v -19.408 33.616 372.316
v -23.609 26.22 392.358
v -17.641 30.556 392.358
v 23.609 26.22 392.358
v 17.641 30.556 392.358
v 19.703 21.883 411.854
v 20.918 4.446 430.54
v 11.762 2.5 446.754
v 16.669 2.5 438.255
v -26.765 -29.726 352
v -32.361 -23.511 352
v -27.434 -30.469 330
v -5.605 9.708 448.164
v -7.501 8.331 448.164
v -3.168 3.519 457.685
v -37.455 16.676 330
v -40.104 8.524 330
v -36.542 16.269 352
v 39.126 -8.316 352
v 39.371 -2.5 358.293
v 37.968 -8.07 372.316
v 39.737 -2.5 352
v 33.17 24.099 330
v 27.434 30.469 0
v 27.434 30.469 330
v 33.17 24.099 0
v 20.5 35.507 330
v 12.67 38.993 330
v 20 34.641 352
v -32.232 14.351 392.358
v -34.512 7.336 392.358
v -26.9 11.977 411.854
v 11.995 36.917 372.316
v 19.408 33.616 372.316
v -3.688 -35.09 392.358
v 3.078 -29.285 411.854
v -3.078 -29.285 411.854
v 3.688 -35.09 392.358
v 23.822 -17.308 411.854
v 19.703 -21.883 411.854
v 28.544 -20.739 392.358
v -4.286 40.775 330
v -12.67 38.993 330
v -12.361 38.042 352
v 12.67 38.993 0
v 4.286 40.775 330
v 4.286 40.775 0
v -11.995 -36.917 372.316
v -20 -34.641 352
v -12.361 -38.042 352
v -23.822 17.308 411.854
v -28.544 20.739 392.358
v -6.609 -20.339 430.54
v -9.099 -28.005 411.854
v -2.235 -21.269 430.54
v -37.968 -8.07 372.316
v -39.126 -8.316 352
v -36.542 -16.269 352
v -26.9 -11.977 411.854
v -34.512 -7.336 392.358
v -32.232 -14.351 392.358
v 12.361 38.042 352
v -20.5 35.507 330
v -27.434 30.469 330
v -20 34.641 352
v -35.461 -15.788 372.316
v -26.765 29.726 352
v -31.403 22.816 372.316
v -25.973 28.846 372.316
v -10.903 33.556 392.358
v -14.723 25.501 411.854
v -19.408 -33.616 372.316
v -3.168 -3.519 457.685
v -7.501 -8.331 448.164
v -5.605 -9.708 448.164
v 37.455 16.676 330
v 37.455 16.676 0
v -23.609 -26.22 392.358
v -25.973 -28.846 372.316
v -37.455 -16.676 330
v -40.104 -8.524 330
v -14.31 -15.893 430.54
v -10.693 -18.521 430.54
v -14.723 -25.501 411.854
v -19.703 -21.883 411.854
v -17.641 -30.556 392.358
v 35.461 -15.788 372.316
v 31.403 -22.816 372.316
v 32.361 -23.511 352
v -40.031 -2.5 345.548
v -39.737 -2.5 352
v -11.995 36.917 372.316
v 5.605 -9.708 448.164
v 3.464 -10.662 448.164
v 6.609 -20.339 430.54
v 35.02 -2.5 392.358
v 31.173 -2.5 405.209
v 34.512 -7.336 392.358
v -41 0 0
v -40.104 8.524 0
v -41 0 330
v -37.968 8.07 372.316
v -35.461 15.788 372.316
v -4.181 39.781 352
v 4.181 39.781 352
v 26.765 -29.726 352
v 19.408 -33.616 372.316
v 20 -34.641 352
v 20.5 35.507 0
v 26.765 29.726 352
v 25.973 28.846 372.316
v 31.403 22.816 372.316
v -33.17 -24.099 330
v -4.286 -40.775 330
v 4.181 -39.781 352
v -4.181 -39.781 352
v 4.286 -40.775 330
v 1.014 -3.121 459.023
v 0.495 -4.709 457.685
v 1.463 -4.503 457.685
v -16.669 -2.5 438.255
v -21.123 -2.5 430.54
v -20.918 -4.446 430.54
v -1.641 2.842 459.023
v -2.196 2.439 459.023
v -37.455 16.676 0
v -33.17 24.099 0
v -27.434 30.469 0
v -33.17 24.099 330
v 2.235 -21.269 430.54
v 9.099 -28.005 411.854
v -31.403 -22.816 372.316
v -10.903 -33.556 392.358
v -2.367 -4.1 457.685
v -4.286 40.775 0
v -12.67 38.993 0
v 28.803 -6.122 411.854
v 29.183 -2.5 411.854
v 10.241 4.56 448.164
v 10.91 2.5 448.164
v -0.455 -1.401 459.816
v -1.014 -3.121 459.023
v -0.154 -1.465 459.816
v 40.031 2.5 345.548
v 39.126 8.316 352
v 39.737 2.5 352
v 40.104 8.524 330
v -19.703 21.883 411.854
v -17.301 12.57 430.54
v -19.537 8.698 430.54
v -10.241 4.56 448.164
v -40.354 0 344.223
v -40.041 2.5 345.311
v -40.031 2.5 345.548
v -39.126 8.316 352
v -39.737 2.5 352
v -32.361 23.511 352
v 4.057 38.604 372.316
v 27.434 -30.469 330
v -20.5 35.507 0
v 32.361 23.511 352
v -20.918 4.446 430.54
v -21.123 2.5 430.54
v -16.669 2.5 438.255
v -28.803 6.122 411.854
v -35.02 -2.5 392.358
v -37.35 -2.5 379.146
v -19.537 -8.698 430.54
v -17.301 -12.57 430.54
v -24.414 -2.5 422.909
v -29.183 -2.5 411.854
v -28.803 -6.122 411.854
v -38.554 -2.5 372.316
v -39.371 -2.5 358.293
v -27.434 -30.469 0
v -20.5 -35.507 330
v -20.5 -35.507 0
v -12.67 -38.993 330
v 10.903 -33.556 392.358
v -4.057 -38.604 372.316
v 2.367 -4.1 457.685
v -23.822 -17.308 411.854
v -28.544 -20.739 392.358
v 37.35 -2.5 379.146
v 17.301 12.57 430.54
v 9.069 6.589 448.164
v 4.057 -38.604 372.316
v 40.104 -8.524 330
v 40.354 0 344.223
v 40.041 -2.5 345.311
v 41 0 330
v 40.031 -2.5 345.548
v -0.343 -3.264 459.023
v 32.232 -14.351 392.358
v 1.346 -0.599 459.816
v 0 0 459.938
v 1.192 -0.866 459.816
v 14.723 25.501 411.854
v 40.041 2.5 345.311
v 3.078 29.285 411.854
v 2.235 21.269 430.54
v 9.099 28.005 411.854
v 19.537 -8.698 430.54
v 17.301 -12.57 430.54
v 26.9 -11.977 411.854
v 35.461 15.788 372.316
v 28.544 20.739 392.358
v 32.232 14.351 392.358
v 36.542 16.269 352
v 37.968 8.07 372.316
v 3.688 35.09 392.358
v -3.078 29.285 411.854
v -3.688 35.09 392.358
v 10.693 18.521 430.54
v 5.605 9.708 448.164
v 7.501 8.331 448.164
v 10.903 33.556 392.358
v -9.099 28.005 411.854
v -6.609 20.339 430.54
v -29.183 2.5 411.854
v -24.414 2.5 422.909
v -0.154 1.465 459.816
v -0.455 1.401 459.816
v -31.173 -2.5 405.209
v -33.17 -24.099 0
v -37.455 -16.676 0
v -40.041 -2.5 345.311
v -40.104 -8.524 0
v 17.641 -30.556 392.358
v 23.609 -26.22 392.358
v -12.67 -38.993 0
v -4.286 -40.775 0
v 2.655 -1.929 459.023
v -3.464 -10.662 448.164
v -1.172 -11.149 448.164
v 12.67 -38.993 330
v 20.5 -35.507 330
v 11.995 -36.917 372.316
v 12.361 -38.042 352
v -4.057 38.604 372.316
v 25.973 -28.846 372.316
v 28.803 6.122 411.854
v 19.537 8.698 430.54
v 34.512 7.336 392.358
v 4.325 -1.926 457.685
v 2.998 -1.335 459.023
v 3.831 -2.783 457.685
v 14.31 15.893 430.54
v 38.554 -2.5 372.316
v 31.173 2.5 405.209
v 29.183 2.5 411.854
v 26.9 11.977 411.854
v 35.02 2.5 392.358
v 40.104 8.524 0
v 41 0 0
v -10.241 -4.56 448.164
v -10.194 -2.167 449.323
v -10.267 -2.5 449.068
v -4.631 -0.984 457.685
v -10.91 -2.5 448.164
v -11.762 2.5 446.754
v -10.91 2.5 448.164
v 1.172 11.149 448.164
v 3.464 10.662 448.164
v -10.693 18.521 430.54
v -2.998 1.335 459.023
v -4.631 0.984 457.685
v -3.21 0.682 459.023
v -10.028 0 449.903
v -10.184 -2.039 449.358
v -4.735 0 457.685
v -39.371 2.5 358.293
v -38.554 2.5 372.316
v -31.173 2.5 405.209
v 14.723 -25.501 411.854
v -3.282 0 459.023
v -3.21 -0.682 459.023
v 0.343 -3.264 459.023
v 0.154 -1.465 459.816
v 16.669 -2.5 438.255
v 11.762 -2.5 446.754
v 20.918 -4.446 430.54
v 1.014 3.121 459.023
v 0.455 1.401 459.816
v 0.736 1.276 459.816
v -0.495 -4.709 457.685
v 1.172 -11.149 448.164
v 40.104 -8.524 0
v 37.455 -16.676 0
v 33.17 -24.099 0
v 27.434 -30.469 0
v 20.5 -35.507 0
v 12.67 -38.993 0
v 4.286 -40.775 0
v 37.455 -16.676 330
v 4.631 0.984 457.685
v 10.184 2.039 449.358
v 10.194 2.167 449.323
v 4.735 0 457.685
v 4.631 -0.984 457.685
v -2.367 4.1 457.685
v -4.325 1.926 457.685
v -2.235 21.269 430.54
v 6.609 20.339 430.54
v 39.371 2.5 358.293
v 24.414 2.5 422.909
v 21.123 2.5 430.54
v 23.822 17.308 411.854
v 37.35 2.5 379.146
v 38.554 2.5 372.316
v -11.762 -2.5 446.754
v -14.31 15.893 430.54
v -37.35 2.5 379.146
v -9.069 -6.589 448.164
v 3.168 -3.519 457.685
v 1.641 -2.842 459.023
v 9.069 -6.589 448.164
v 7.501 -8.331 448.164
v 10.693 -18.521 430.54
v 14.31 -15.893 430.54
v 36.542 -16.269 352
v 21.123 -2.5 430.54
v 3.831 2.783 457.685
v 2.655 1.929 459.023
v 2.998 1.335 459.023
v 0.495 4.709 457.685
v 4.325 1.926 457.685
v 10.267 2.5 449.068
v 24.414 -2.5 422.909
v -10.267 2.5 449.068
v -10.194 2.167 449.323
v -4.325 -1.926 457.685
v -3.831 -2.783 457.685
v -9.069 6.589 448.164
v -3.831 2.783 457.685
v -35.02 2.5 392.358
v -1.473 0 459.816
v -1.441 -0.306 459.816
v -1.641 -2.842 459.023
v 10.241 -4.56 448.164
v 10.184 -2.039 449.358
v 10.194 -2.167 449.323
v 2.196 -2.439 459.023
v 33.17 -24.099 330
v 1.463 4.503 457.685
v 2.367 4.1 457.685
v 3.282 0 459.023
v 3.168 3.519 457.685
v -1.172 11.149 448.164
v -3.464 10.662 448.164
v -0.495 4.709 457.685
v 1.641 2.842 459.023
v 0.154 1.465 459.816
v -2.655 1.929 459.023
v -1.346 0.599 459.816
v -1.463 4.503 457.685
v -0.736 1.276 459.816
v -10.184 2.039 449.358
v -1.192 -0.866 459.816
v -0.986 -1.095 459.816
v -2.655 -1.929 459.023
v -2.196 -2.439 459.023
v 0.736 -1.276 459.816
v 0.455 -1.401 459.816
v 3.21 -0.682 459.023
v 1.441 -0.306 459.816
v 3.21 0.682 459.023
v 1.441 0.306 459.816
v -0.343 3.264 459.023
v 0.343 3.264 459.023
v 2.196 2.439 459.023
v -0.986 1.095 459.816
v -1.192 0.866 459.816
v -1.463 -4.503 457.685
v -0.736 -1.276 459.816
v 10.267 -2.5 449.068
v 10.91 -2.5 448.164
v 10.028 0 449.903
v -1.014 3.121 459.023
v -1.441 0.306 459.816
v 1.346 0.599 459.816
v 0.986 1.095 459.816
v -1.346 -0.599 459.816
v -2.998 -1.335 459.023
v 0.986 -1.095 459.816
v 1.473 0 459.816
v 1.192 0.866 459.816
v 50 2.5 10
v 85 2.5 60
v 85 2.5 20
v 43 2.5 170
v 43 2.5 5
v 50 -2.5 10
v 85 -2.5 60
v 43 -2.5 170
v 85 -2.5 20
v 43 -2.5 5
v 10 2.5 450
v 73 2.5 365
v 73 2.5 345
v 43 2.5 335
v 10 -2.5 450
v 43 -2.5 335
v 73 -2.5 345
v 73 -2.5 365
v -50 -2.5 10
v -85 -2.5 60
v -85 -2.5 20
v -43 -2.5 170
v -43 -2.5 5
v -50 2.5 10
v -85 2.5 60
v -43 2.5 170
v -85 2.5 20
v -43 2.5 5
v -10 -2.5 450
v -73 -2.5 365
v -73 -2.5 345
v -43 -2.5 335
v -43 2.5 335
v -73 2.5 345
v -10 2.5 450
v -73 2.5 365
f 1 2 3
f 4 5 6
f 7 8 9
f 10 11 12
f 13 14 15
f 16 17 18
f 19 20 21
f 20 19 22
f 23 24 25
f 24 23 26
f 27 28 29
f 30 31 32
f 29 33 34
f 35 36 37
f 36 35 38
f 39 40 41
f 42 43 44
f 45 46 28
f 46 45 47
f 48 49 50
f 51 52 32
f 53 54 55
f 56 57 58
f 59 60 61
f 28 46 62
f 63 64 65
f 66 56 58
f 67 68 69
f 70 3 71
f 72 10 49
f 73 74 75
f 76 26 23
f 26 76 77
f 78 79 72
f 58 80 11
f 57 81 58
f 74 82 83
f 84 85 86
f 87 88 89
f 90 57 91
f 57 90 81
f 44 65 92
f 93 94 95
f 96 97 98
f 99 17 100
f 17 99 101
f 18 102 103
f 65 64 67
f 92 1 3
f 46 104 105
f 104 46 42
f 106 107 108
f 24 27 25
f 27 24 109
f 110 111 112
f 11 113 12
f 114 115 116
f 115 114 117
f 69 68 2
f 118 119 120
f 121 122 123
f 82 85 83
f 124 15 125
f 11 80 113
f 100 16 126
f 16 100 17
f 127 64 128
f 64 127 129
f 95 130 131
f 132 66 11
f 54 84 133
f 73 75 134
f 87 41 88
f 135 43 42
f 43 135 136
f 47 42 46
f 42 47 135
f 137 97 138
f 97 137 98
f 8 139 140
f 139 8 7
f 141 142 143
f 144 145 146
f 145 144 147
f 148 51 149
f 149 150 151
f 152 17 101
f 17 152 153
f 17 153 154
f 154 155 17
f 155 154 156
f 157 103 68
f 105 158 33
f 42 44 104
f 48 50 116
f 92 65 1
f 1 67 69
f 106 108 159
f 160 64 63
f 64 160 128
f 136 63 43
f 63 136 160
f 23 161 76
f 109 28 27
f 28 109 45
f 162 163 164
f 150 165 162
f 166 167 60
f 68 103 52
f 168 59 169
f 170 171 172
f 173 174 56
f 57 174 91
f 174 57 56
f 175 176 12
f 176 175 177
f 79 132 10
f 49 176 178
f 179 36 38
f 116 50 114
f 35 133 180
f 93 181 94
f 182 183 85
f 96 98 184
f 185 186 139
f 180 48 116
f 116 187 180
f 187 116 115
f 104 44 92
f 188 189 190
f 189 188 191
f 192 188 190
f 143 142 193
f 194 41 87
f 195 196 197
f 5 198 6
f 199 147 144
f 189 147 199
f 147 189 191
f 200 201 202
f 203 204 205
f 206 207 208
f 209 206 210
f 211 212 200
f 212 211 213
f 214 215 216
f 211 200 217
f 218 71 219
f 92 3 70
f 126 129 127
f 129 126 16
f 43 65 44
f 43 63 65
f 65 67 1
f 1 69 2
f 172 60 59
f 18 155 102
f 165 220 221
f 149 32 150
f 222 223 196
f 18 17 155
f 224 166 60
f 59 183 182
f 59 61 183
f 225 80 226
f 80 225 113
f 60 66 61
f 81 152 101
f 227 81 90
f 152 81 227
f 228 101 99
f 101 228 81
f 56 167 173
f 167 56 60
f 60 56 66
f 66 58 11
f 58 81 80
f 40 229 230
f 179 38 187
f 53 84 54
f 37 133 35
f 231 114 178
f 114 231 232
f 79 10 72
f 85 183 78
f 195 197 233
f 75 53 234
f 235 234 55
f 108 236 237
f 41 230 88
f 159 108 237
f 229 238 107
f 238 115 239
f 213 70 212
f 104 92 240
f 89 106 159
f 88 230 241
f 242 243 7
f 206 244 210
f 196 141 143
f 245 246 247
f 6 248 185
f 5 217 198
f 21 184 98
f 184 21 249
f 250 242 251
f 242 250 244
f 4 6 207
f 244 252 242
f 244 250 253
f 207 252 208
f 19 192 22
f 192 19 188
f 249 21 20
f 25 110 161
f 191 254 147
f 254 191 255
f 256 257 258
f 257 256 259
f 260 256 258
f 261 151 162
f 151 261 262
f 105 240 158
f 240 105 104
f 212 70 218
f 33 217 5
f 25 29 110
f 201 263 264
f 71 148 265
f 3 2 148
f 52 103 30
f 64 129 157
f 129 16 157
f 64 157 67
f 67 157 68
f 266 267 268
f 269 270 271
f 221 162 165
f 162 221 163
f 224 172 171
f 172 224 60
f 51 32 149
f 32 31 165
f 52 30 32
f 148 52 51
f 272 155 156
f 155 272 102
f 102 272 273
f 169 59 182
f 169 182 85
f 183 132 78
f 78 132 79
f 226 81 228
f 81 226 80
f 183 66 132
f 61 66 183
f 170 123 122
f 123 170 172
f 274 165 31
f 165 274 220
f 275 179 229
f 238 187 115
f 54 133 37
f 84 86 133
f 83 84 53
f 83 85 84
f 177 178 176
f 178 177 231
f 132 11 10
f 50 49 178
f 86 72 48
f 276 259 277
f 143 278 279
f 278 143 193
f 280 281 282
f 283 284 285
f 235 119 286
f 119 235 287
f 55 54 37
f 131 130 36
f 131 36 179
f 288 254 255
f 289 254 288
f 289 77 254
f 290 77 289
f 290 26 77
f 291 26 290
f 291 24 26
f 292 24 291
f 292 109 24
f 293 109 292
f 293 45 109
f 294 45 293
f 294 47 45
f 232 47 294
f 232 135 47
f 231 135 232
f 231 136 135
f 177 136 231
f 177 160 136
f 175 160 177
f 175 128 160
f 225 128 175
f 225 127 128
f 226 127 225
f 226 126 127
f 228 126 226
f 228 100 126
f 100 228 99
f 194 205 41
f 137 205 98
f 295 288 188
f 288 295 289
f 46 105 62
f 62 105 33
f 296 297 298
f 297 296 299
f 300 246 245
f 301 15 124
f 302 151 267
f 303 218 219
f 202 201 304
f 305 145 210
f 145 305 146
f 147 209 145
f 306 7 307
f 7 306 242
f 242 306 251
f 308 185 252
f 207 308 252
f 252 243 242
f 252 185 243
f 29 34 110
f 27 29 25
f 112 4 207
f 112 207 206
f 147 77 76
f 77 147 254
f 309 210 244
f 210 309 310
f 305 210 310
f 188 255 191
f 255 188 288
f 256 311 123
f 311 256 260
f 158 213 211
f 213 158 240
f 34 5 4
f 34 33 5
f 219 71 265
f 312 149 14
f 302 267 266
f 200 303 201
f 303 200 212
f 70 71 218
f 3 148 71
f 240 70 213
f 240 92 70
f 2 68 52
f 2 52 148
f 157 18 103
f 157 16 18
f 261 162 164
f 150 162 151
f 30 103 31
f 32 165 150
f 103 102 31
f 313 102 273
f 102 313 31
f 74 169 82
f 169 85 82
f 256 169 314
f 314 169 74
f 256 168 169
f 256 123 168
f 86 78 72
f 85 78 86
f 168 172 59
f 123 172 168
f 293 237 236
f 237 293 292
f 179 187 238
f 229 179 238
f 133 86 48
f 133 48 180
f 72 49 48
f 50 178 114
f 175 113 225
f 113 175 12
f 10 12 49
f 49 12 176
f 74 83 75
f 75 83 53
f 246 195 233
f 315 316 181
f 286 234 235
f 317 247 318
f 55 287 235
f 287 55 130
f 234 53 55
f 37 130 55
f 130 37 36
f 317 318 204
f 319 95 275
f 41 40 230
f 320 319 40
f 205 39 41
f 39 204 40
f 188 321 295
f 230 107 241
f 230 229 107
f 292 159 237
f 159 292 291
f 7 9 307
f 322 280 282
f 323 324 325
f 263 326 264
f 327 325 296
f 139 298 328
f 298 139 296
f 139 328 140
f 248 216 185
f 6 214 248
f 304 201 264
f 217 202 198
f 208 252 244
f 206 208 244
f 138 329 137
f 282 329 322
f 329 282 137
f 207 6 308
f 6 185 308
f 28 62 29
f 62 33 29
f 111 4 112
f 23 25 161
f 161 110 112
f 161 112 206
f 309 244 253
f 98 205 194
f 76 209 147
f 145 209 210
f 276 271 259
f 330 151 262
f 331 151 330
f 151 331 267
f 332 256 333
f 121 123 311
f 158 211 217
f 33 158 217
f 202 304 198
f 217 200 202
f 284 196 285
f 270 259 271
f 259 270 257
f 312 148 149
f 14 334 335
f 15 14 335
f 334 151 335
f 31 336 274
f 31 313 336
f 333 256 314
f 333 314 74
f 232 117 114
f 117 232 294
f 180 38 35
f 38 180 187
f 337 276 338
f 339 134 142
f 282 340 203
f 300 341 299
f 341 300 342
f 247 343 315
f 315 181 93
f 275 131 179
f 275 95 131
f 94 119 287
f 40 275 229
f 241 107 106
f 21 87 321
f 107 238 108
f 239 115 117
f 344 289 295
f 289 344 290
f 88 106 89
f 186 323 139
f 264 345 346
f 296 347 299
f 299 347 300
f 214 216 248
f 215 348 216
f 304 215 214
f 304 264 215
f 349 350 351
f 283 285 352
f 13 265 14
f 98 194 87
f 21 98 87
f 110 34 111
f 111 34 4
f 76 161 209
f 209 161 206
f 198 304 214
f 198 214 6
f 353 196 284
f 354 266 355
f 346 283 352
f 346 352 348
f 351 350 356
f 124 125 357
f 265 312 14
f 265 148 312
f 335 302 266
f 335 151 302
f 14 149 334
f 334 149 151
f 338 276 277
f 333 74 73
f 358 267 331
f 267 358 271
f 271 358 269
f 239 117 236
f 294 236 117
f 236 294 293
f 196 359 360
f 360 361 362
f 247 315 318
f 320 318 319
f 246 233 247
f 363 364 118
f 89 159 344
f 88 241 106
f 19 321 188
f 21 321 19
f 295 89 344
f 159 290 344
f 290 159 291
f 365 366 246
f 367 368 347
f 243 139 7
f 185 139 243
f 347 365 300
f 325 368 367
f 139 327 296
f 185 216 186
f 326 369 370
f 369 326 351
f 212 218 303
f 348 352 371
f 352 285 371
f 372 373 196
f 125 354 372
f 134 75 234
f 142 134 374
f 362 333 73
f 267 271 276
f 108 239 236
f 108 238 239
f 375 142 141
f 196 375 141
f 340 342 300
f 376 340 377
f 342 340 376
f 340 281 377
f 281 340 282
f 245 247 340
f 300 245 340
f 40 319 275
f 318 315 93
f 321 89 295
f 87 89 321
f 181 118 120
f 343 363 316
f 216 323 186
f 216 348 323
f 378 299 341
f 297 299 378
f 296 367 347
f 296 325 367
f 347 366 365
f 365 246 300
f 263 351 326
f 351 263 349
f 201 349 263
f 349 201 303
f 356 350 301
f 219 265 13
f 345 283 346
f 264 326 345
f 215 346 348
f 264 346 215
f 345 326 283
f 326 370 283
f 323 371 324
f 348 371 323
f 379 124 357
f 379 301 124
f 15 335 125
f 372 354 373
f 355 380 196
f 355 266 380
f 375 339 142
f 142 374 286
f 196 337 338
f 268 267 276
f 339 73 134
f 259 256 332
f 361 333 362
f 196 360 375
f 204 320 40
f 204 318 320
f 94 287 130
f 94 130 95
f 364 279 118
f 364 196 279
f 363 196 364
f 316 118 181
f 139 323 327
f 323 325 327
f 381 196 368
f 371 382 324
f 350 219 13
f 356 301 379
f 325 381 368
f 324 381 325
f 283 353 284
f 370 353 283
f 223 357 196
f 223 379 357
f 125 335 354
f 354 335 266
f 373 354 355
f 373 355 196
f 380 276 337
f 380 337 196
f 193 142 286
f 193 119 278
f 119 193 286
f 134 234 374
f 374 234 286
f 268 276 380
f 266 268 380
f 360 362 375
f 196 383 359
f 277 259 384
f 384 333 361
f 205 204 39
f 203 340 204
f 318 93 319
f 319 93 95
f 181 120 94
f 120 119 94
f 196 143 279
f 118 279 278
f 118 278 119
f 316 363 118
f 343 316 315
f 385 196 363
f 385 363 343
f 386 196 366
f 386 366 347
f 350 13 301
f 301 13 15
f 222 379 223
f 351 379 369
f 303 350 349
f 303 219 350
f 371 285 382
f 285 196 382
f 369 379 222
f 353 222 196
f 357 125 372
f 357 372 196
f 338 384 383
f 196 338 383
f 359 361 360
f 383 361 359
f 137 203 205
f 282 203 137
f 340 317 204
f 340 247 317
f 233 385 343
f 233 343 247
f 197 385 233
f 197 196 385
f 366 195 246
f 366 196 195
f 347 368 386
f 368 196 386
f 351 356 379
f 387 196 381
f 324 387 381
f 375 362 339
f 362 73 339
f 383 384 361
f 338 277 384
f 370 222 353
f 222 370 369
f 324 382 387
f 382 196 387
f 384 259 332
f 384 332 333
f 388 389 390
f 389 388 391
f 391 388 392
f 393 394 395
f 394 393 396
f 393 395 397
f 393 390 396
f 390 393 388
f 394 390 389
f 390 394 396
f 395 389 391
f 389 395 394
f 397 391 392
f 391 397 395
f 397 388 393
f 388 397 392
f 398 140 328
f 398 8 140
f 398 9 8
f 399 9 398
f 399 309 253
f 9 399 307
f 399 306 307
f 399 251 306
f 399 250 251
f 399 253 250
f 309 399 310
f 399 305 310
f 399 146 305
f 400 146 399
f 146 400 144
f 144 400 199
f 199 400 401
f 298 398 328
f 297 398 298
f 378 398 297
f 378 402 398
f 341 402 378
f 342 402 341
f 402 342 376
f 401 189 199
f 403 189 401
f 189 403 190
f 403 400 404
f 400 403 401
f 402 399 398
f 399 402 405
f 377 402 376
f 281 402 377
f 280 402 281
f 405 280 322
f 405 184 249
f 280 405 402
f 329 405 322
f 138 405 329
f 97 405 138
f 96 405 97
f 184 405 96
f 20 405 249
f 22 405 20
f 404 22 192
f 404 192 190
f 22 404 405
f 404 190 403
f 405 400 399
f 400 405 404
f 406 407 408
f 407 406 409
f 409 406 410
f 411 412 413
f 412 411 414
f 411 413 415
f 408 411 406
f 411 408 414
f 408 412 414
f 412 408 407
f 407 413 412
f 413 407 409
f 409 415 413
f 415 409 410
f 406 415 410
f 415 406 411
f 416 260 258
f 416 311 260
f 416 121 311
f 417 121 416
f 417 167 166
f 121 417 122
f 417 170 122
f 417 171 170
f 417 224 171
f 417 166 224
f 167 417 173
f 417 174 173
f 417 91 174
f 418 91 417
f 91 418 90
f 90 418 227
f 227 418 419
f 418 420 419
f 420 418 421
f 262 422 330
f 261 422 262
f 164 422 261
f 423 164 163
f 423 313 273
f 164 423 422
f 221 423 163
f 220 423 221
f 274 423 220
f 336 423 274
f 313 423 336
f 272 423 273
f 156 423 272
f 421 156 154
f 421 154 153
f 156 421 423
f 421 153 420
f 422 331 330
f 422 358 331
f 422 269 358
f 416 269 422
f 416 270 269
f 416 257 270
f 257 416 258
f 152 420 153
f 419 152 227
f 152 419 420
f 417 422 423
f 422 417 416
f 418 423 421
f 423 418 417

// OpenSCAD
rotate_extrude()
{hull()   {
     intersection (){
    square([41,465]);
    translate([0,454])circle(6);
     }
    intersection (){
    square([41,459]);
        
    union(){    
    square([41,330]);
    translate([-135,352])circle(175,$fn=54);
        
        
        }}}}
 
        
   rotate([90,0,0])   linear_extrude(5,center=true)   polygon([[43,5],[50,10],[85,20],[85,60],[43,170]]); 
        
   rotate([90,0,0])   linear_extrude(5,center=true)   polygon([[43,335],[73,345],[73,365],[10,450], ]);   
        
   rotate([90,0,180])   linear_extrude(5,center=true)   polygon([[43,5],[50,10],[85,20],[85,60],[43,170]]); 
        
   rotate([90,0,180])   linear_extrude(5,center=true)   polygon([[43,335],[73,345],[73,365],[10,450], ]);
